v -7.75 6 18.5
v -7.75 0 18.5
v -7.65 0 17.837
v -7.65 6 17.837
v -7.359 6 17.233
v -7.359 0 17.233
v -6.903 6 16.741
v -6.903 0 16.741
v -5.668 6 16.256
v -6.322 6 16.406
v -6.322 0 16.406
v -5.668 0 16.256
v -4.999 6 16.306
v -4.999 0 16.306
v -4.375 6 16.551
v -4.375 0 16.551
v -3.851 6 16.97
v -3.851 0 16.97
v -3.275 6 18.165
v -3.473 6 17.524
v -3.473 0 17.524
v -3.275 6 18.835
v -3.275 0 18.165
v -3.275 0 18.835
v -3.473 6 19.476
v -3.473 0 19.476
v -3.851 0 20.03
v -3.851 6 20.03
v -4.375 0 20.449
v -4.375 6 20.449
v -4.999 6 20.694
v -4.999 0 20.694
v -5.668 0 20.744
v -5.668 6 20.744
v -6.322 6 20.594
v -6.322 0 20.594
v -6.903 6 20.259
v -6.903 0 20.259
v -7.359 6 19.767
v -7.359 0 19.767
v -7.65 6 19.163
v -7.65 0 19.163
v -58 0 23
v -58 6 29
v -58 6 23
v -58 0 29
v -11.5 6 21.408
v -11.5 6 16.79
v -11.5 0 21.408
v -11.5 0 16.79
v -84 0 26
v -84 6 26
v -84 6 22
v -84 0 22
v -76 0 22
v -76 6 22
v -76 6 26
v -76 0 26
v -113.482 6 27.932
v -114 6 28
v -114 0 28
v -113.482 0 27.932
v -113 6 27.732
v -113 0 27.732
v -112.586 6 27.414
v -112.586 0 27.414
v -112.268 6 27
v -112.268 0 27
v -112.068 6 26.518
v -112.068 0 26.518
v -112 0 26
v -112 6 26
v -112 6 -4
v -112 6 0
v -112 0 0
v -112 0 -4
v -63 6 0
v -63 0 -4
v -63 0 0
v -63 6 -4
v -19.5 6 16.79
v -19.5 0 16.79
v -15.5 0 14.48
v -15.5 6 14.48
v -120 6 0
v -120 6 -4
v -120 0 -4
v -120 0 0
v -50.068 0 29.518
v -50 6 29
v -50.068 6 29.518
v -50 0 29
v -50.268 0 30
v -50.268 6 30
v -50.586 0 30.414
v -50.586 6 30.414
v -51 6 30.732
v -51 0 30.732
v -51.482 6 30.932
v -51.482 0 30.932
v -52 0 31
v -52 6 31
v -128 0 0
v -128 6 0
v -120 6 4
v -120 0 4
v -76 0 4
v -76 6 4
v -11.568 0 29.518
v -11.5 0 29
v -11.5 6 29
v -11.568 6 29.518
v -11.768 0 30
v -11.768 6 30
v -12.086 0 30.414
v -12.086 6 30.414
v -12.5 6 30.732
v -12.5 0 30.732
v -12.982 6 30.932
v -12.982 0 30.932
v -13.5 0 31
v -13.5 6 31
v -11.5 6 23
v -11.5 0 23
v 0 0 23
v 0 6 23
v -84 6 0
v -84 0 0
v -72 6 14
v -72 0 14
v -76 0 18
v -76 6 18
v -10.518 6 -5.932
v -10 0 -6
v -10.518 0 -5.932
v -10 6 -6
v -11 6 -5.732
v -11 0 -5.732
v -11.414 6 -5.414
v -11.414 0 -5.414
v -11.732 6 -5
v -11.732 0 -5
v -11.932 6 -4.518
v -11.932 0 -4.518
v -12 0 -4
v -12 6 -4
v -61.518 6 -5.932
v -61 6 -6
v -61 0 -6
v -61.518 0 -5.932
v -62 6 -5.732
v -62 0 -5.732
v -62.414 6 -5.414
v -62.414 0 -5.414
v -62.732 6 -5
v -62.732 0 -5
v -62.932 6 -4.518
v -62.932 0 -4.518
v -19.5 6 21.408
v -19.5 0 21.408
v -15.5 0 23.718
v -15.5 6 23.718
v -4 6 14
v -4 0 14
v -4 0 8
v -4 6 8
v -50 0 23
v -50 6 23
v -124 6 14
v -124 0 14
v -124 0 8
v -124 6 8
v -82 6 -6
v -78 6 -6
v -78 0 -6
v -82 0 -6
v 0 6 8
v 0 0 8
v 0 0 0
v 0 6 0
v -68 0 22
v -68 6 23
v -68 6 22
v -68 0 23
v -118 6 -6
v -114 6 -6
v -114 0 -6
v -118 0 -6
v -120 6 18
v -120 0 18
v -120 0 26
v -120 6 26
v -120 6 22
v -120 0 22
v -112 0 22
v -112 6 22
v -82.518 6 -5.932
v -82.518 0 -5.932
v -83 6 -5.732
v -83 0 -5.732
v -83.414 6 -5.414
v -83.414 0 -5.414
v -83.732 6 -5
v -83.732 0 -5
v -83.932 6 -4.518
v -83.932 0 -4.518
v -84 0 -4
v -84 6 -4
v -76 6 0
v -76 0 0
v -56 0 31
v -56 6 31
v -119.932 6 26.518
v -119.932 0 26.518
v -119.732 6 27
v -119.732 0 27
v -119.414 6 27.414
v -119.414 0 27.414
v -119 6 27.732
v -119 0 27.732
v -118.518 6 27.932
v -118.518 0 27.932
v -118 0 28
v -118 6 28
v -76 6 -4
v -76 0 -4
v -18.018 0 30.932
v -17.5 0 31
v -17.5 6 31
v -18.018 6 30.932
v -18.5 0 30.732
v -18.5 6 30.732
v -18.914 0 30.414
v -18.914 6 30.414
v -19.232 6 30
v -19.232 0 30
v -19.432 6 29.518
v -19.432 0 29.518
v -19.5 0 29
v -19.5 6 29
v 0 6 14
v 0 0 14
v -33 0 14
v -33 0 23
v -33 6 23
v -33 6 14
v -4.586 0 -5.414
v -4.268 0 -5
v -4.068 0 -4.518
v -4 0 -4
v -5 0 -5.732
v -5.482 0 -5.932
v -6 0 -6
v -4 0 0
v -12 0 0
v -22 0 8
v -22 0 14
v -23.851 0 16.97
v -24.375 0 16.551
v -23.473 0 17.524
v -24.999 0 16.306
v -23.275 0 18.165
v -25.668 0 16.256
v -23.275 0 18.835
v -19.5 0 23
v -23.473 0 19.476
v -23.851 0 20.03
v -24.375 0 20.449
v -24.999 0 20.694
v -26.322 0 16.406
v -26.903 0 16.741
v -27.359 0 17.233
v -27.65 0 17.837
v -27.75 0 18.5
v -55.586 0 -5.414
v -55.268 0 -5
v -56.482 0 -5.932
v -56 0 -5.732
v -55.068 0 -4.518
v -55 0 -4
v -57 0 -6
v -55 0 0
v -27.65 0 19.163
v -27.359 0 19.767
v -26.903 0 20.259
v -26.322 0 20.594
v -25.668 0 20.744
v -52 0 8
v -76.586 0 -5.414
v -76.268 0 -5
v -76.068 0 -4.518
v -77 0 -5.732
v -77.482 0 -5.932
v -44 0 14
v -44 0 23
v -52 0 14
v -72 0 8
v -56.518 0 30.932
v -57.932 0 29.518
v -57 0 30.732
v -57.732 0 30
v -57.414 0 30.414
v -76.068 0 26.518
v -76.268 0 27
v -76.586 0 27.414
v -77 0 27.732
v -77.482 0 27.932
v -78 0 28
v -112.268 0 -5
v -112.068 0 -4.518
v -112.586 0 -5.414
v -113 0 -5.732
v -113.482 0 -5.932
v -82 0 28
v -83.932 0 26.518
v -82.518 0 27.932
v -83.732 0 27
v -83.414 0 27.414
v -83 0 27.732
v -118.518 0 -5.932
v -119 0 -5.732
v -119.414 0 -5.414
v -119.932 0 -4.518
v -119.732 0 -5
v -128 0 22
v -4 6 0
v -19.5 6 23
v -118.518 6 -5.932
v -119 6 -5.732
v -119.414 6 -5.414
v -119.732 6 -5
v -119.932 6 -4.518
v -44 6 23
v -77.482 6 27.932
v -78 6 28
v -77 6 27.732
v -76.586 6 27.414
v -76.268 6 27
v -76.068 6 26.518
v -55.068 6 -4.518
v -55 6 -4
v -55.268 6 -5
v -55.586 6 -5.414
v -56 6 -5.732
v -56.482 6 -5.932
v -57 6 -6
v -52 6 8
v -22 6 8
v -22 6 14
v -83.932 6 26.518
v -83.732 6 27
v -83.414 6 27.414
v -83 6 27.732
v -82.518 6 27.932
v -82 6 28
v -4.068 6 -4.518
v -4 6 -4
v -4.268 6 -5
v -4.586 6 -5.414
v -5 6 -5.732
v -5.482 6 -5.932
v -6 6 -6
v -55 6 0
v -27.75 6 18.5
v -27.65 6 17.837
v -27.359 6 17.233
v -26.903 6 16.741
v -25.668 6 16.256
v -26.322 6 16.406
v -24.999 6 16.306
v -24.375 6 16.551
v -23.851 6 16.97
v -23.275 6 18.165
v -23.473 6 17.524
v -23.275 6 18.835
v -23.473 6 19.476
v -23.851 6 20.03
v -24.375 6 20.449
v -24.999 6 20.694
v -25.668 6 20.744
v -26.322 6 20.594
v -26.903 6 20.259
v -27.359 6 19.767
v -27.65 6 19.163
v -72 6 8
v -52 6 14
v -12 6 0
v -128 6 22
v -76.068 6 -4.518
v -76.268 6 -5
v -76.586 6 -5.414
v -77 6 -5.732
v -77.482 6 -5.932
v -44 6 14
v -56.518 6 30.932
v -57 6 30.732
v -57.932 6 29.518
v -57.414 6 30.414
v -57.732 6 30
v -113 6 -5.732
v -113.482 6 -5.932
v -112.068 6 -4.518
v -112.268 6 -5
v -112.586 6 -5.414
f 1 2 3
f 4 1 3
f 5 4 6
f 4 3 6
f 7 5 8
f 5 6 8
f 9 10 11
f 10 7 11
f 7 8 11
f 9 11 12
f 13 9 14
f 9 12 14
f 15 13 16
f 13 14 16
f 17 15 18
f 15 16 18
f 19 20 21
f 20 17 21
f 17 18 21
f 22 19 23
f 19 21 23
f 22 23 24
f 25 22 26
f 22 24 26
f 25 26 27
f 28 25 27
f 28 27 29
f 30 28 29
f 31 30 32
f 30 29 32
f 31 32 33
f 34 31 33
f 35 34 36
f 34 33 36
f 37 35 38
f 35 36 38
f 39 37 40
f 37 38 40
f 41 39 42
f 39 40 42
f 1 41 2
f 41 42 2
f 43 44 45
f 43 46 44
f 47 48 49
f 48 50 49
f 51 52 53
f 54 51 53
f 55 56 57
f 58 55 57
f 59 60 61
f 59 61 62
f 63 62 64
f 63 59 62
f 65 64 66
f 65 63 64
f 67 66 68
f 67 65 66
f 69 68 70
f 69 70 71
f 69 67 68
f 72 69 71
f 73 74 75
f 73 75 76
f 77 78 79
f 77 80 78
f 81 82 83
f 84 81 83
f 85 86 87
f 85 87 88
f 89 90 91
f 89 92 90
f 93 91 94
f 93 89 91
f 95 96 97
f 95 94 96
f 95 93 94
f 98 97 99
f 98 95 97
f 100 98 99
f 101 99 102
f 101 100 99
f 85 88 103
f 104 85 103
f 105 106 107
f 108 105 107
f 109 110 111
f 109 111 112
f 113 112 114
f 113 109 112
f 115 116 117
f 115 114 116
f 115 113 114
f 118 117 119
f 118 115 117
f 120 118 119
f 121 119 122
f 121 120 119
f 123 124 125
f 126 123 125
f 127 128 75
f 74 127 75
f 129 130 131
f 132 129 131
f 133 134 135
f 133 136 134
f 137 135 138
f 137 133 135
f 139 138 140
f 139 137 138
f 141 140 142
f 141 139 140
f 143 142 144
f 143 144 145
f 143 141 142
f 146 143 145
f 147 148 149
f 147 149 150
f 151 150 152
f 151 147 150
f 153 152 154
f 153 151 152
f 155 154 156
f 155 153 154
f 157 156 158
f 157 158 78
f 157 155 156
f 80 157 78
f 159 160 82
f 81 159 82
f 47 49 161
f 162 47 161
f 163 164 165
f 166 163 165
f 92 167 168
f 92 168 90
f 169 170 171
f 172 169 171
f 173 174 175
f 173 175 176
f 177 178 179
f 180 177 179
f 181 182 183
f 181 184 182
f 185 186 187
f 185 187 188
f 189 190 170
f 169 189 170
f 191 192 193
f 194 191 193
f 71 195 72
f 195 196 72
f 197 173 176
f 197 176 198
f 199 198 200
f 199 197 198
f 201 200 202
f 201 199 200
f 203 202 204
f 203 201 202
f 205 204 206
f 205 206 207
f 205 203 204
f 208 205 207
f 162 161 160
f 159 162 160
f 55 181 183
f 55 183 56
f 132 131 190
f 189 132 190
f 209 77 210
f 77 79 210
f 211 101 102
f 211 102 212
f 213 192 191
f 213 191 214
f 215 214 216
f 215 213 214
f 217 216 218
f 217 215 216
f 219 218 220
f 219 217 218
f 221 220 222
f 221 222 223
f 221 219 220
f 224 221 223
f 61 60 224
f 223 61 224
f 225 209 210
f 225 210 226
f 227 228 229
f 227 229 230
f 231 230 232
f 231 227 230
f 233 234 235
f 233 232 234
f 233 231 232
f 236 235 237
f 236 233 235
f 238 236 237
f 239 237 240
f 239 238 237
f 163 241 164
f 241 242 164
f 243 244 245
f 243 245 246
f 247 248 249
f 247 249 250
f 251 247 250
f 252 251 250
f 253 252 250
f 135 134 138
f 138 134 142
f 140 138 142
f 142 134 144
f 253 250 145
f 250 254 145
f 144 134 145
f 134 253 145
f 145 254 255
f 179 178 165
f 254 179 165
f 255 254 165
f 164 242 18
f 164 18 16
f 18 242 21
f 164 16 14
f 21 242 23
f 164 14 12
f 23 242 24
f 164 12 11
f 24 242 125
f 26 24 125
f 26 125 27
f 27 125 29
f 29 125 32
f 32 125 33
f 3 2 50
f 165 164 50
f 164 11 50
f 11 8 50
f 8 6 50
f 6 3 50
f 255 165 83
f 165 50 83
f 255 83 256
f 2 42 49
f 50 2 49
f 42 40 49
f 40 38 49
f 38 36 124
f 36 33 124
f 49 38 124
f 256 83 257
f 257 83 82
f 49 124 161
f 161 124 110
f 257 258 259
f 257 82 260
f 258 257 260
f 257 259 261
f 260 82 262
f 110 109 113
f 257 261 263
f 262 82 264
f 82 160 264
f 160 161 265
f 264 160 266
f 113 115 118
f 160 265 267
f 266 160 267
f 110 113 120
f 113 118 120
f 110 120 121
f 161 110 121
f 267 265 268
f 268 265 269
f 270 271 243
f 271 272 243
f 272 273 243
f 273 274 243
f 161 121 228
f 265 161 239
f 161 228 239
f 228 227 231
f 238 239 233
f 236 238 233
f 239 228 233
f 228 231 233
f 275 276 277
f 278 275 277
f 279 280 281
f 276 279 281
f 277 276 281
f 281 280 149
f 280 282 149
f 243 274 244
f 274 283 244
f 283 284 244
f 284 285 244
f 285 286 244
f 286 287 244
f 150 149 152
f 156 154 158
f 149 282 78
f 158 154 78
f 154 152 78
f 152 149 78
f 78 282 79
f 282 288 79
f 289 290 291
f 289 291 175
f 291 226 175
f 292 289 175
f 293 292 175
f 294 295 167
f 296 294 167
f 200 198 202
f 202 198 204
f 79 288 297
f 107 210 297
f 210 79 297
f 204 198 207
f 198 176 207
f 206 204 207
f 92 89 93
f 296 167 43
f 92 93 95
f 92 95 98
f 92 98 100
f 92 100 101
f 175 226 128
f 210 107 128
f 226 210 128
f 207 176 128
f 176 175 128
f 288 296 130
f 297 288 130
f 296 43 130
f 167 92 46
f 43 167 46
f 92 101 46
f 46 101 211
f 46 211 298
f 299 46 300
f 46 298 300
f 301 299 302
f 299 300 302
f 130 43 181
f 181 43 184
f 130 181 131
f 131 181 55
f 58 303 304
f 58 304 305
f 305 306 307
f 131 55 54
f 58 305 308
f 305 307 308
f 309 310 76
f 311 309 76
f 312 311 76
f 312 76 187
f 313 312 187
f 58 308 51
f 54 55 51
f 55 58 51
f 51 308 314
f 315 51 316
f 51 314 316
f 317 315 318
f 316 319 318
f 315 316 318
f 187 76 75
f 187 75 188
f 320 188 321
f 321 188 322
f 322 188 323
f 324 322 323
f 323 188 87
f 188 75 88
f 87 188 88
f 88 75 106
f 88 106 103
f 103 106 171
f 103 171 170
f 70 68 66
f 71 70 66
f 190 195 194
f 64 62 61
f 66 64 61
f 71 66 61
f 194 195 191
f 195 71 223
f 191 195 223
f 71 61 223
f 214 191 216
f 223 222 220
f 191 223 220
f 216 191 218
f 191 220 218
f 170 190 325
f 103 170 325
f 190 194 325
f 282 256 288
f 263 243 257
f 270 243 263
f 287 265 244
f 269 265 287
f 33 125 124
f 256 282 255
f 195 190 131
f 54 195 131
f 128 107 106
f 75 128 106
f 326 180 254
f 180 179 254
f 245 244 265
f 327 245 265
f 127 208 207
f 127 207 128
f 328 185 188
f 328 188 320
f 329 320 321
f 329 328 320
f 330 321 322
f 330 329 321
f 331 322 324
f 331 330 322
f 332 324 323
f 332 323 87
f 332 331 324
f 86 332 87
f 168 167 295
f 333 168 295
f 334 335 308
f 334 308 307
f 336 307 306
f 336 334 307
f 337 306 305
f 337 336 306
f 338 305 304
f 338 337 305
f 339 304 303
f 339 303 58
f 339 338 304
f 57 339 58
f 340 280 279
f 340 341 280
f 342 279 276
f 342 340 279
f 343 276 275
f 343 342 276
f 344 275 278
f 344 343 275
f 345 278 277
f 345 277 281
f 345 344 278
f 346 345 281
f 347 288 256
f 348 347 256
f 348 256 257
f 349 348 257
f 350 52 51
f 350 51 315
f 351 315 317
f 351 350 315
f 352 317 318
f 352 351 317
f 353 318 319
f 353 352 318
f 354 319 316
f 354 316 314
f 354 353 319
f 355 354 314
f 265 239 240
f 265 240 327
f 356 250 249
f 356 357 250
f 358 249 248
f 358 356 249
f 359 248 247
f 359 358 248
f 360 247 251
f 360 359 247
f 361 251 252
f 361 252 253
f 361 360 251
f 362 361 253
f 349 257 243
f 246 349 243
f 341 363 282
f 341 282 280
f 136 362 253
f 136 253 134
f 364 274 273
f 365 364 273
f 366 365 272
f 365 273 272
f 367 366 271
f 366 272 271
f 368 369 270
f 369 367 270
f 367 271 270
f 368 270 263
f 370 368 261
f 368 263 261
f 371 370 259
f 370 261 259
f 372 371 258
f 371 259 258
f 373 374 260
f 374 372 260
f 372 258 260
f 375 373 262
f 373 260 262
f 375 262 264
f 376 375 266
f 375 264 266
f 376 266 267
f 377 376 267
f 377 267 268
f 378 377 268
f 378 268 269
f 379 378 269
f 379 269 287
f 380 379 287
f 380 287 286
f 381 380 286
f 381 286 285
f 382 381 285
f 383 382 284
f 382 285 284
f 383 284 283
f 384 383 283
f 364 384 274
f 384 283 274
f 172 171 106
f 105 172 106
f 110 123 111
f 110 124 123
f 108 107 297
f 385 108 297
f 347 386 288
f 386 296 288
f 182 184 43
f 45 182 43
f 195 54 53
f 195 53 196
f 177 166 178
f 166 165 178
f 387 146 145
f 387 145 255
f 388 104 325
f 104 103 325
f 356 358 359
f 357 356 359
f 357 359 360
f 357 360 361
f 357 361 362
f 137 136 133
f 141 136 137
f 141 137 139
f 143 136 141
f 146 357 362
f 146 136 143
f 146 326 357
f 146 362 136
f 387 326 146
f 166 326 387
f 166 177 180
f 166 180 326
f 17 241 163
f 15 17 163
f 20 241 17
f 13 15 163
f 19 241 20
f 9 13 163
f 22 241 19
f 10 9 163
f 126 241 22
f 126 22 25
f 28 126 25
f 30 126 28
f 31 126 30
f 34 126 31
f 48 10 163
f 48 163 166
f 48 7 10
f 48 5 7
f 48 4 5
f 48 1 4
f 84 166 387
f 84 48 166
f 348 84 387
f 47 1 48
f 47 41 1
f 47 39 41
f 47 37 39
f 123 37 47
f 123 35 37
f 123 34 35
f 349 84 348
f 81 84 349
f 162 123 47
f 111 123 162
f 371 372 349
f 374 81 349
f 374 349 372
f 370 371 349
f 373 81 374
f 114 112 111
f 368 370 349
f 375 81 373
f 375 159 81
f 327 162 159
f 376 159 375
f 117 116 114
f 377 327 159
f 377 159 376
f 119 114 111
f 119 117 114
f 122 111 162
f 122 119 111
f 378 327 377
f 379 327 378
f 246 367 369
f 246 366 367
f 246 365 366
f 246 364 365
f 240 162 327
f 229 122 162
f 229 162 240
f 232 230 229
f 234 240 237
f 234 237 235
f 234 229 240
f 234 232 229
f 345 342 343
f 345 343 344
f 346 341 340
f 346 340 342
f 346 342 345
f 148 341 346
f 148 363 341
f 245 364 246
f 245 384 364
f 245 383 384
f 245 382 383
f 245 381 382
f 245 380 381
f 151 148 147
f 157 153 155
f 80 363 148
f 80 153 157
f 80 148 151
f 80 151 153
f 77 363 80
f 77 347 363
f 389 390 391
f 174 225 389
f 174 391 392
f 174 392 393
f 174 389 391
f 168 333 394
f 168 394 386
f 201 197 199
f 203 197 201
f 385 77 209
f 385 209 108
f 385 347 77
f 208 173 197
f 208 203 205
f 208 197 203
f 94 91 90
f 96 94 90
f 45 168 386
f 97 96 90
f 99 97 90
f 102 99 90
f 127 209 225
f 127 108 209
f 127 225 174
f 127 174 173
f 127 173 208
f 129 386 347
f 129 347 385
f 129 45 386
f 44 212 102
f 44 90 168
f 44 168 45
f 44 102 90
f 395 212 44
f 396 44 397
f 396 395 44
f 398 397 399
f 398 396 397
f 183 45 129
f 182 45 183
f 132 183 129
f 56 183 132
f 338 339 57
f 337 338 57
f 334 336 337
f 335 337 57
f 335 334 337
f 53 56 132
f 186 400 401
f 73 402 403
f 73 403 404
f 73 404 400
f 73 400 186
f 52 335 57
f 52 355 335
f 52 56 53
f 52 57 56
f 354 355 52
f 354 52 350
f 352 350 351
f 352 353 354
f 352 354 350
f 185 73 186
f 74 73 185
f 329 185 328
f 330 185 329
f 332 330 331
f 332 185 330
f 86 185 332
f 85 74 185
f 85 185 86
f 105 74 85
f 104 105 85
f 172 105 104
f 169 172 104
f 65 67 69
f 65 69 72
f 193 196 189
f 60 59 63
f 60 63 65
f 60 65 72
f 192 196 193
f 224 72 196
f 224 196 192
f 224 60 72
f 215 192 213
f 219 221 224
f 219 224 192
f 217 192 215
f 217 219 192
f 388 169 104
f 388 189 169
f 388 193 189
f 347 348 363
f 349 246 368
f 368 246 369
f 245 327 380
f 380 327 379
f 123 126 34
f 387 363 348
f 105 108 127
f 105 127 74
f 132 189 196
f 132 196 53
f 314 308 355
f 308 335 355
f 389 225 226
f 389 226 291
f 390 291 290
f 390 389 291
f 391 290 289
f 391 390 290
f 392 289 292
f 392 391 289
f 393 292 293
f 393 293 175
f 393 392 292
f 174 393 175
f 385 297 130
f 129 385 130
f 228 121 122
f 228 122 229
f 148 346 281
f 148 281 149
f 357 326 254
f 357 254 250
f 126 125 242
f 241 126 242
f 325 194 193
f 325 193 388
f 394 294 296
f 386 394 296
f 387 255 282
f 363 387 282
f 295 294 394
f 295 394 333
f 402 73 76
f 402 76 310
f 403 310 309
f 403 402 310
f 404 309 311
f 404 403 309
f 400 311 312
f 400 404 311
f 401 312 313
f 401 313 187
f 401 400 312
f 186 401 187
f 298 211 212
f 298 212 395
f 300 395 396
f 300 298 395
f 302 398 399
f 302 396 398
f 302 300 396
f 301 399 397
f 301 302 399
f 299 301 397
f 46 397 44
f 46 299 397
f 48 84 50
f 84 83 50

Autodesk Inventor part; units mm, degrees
ref_plane "YZ Plane" through (0, 0, 0) normal (1, 0, 0) x (0, 1, 0)
ref_plane "XZ Plane" through (0, 0, 0) normal (0, 1, 0) x (-1, 0, 0)
ref_plane "XY Plane" through (0, 0, 0) normal (0, 0, 1) x (1, 0, 0)
sketch "Sketch1" plane through (0, 0, 0) normal (0, 1, 0) x (-1, 0, 0)
  line L0 (0, 0) -> (128, 0)
  line L1 (128, 0) -> (128, 22)
  line L2 (52, 14) -> (52, 8)
  line L3 (52, 8) -> (22, 8)
  line L4 (22, 8) -> (22, 14)
  circle A0 centre (5.5, 18.5) radius 2.25
  circle A1 centre (5.5, 18.5) radius 4.5 construction
  circle A2 centre (25.5, 18.5) radius 2.25
  circle A3 centre (25.5, 18.5) radius 4.5 construction
  line L5 (33, 14) -> (44, 14) construction
  circle A4 centre (38.5, 19.099) radius 7.5 construction
  circle A5 centre (38.5, 19.099) radius 4 construction
  line L6 (33, 23) -> (33, 14)
  line L7 (44, 14) -> (44, 23)
  line L8 (22, 14) -> (33, 14)
  line L9 (44, 14) -> (52, 14)
  line L10 (0, 14) -> (4, 14)
  line L11 (4, 14) -> (4, 8)
  line L12 (4, 8) -> (0, 8)
  line L13 (0, 23) -> (0, 14)
  line L14 (0, 8) -> (0, 0)
  line L15 (11.5, 23) -> (11.5, 29)
  line L16 (13.5, 31) -> (17.5, 31)
  line L17 (19.5, 29) -> (19.5, 23)
  arc A6 (13.5, 31) -> (11.5, 29) centre (13.5, 29) ccw
  arc A7 (19.5, 29) -> (17.5, 31) centre (17.5, 29) ccw
  line L18 (33, 23) -> (19.5, 23)
  line L19 (11.5, 23) -> (0, 23)
  line L20 (50, 23) -> (50, 29)
  line L21 (52, 31) -> (56, 31)
  line L22 (58, 29) -> (58, 23)
  arc A8 (52, 31) -> (50, 29) centre (52, 29) ccw
  arc A9 (58, 29) -> (56, 31) centre (56, 29) ccw
  line L23 (68, 23) -> (58, 23)
  line L24 (50, 23) -> (44, 23)
  line L25 (68, 23) -> (68, 22)
  line L26 (68, 22) -> (128, 22)
  line L27 (19.5, 16.7896) -> (15.5, 14.4802)
  line L28 (15.5, 14.4802) -> (11.5, 16.7896)
  line L29 (11.5, 16.7896) -> (11.5, 21.4084)
  line L30 (11.5, 21.4084) -> (15.5, 23.7178)
  line L31 (15.5, 23.7178) -> (19.5, 21.4084)
  line L32 (19.5, 21.4084) -> (19.5, 16.7896)
  point P0 (15.5, 19.099)
  point P1 (0, 18.5)
  point P2 (15.5, 31)
  point P3 (15.5, 19.099)
  dimension "d0" = 6
  dimension "d1" = 8
  dimension "d3" = 4.5
  dimension "d4" = 9
  dimension "d5" = 4.5
  dimension "d6" = 9
  dimension "d8" = 11
  dimension "d9" = 8
  dimension "d10" = 15
  dimension "d11" = 9
  dimension "d12" = 4
  dimension "d13" = 5.5
  dimension "d14" = 10
  dimension "d15" = 10
  dimension "d16" = 2
  dimension "d17" = 8
  dimension "d18" = 8
  dimension "d19" = 23
  dimension "d20" = 30
  dimension "d21" = 18
  dimension "d23" = 2
  dimension "d24" = 8
  dimension "d25" = 6
  dimension "d26" = 8
  dimension "d27" = 10
  dimension "d29" = 60
  dimension "d30" = 8
extrude "Extrusion1" add sketch "Sketch1" along normal blind 6
sketch "Sketch2" plane through (0, 6, 0) normal (0, 1, 0) x (1, 0, 0)
  line L0 (-128, 0) -> (-128, -22) projected
  line L1 (-128, -22) -> (-68, -22) projected
  line L2 (-68, -22) -> (-68, -23) projected
  line L3 (-120, -22) -> (-112, -22)
  line L4 (-112, -22) -> (-112, -26)
  line L5 (-114, -28) -> (-118, -28)
  line L6 (-120, -26) -> (-120, -22)
  line L7 (-84, -22) -> (-76, -22)
  line L8 (-76, -22) -> (-76, -26)
  line L9 (-78, -28) -> (-82, -28)
  line L10 (-84, -26) -> (-84, -22)
  arc A0 (-84, -26) -> (-82, -28) centre (-82, -26) ccw
  arc A1 (-78, -28) -> (-76, -26) centre (-78, -26) ccw
  arc A2 (-114, -28) -> (-112, -26) centre (-114, -26) ccw
  arc A3 (-120, -26) -> (-118, -28) centre (-118, -26) ccw
  dimension "d33" = 2
  dimension "d34" = 8
  dimension "d35" = 6
  dimension "d36" = 8
  dimension "d37" = 8
  dimension "d38" = 8
extrude "Extrusion2" add sketch "Sketch2" against normal blind 6
sketch "Sketch3" plane through (0, 6, 0) normal (0, 1, 0) x (1, 0, 0)
  line L0 (0, 0) -> (-128, 0) projected
  line L1 (-112, -26) -> (-112, -22) projected
  line L2 (-76, -26) -> (-76, -22) projected
  line L3 (0, -8) -> (0, 0) projected
  line L4 (-120, 0) -> (-112, 0)
  line L5 (-112, 0) -> (-112, 4)
  line L6 (-114, 6) -> (-118, 6)
  line L7 (-120, 4) -> (-120, 0)
  line L8 (-84, 0) -> (-76, 0)
  line L9 (-76, 0) -> (-76, 4)
  line L10 (-78, 6) -> (-82, 6)
  line L11 (-84, 4) -> (-84, 0)
  line L12 (-63, 0) -> (-55, 0)
  line L13 (-55, 0) -> (-55, 4)
  line L14 (-57, 6) -> (-61, 6)
  line L15 (-63, 4) -> (-63, 0)
  line L16 (-12, 0) -> (-4, 0)
  line L17 (-4, 0) -> (-4, 4)
  line L18 (-6, 6) -> (-10, 6)
  line L19 (-12, 4) -> (-12, 0)
  arc A0 (-118, 6) -> (-120, 4) centre (-118, 4) ccw
  arc A1 (-112, 4) -> (-114, 6) centre (-114, 4) ccw
  arc A2 (-82, 6) -> (-84, 4) centre (-82, 4) ccw
  arc A3 (-76, 4) -> (-78, 6) centre (-78, 4) ccw
  arc A4 (-61, 6) -> (-63, 4) centre (-61, 4) ccw
  arc A5 (-55, 4) -> (-57, 6) centre (-57, 4) ccw
  arc A6 (-10, 6) -> (-12, 4) centre (-10, 4) ccw
  arc A7 (-4, 4) -> (-6, 6) centre (-6, 4) ccw
  dimension "d41" = 2
  dimension "d42" = 6
  dimension "d43" = 8
  dimension "d44" = 8
  dimension "d45" = 8
  dimension "d46" = 8
  dimension "d47" = 4
  dimension "d48" = 43
extrude "Extrusion3" add sketch "Sketch3" against normal blind 6
sketch "Sketch4" plane through (0, 0, 0) normal (0, -1, 0) x (1, 0, 0)
  line L0 (-112, 22) -> (-84, 22) projected
  line L1 (-128, 0) -> (-128, 22) projected
  line L2 (-84, 0) -> (-112, 0) projected
  line L3 (-63, 0) -> (-76, 0) projected
  line L4 (-4, -4) -> (-4, 0) projected
  line L5 (-124, 14) -> (-124, 8)
  line L6 (-124, 8) -> (-120, 4)
  line L7 (-120, 4) -> (-76, 4)
  line L8 (-76, 4) -> (-72, 8)
  line L9 (-72, 8) -> (-72, 14)
  line L10 (-72, 14) -> (-76, 18)
  line L11 (-76, 18) -> (-120, 18)
  line L12 (-120, 18) -> (-124, 14)
  line L13 (-68, 22) -> (-68, 0) construction
  dimension "d52" = 45
  dimension "d53" = 4
  dimension "d54" = 4
  dimension "d55" = 4
  dimension "d56" = 4
  dimension "d57" = 4
extrude "Extrusion4" cut sketch "Sketch4" against normal blind 6
properties part number "x_iddler_wall_lower"
